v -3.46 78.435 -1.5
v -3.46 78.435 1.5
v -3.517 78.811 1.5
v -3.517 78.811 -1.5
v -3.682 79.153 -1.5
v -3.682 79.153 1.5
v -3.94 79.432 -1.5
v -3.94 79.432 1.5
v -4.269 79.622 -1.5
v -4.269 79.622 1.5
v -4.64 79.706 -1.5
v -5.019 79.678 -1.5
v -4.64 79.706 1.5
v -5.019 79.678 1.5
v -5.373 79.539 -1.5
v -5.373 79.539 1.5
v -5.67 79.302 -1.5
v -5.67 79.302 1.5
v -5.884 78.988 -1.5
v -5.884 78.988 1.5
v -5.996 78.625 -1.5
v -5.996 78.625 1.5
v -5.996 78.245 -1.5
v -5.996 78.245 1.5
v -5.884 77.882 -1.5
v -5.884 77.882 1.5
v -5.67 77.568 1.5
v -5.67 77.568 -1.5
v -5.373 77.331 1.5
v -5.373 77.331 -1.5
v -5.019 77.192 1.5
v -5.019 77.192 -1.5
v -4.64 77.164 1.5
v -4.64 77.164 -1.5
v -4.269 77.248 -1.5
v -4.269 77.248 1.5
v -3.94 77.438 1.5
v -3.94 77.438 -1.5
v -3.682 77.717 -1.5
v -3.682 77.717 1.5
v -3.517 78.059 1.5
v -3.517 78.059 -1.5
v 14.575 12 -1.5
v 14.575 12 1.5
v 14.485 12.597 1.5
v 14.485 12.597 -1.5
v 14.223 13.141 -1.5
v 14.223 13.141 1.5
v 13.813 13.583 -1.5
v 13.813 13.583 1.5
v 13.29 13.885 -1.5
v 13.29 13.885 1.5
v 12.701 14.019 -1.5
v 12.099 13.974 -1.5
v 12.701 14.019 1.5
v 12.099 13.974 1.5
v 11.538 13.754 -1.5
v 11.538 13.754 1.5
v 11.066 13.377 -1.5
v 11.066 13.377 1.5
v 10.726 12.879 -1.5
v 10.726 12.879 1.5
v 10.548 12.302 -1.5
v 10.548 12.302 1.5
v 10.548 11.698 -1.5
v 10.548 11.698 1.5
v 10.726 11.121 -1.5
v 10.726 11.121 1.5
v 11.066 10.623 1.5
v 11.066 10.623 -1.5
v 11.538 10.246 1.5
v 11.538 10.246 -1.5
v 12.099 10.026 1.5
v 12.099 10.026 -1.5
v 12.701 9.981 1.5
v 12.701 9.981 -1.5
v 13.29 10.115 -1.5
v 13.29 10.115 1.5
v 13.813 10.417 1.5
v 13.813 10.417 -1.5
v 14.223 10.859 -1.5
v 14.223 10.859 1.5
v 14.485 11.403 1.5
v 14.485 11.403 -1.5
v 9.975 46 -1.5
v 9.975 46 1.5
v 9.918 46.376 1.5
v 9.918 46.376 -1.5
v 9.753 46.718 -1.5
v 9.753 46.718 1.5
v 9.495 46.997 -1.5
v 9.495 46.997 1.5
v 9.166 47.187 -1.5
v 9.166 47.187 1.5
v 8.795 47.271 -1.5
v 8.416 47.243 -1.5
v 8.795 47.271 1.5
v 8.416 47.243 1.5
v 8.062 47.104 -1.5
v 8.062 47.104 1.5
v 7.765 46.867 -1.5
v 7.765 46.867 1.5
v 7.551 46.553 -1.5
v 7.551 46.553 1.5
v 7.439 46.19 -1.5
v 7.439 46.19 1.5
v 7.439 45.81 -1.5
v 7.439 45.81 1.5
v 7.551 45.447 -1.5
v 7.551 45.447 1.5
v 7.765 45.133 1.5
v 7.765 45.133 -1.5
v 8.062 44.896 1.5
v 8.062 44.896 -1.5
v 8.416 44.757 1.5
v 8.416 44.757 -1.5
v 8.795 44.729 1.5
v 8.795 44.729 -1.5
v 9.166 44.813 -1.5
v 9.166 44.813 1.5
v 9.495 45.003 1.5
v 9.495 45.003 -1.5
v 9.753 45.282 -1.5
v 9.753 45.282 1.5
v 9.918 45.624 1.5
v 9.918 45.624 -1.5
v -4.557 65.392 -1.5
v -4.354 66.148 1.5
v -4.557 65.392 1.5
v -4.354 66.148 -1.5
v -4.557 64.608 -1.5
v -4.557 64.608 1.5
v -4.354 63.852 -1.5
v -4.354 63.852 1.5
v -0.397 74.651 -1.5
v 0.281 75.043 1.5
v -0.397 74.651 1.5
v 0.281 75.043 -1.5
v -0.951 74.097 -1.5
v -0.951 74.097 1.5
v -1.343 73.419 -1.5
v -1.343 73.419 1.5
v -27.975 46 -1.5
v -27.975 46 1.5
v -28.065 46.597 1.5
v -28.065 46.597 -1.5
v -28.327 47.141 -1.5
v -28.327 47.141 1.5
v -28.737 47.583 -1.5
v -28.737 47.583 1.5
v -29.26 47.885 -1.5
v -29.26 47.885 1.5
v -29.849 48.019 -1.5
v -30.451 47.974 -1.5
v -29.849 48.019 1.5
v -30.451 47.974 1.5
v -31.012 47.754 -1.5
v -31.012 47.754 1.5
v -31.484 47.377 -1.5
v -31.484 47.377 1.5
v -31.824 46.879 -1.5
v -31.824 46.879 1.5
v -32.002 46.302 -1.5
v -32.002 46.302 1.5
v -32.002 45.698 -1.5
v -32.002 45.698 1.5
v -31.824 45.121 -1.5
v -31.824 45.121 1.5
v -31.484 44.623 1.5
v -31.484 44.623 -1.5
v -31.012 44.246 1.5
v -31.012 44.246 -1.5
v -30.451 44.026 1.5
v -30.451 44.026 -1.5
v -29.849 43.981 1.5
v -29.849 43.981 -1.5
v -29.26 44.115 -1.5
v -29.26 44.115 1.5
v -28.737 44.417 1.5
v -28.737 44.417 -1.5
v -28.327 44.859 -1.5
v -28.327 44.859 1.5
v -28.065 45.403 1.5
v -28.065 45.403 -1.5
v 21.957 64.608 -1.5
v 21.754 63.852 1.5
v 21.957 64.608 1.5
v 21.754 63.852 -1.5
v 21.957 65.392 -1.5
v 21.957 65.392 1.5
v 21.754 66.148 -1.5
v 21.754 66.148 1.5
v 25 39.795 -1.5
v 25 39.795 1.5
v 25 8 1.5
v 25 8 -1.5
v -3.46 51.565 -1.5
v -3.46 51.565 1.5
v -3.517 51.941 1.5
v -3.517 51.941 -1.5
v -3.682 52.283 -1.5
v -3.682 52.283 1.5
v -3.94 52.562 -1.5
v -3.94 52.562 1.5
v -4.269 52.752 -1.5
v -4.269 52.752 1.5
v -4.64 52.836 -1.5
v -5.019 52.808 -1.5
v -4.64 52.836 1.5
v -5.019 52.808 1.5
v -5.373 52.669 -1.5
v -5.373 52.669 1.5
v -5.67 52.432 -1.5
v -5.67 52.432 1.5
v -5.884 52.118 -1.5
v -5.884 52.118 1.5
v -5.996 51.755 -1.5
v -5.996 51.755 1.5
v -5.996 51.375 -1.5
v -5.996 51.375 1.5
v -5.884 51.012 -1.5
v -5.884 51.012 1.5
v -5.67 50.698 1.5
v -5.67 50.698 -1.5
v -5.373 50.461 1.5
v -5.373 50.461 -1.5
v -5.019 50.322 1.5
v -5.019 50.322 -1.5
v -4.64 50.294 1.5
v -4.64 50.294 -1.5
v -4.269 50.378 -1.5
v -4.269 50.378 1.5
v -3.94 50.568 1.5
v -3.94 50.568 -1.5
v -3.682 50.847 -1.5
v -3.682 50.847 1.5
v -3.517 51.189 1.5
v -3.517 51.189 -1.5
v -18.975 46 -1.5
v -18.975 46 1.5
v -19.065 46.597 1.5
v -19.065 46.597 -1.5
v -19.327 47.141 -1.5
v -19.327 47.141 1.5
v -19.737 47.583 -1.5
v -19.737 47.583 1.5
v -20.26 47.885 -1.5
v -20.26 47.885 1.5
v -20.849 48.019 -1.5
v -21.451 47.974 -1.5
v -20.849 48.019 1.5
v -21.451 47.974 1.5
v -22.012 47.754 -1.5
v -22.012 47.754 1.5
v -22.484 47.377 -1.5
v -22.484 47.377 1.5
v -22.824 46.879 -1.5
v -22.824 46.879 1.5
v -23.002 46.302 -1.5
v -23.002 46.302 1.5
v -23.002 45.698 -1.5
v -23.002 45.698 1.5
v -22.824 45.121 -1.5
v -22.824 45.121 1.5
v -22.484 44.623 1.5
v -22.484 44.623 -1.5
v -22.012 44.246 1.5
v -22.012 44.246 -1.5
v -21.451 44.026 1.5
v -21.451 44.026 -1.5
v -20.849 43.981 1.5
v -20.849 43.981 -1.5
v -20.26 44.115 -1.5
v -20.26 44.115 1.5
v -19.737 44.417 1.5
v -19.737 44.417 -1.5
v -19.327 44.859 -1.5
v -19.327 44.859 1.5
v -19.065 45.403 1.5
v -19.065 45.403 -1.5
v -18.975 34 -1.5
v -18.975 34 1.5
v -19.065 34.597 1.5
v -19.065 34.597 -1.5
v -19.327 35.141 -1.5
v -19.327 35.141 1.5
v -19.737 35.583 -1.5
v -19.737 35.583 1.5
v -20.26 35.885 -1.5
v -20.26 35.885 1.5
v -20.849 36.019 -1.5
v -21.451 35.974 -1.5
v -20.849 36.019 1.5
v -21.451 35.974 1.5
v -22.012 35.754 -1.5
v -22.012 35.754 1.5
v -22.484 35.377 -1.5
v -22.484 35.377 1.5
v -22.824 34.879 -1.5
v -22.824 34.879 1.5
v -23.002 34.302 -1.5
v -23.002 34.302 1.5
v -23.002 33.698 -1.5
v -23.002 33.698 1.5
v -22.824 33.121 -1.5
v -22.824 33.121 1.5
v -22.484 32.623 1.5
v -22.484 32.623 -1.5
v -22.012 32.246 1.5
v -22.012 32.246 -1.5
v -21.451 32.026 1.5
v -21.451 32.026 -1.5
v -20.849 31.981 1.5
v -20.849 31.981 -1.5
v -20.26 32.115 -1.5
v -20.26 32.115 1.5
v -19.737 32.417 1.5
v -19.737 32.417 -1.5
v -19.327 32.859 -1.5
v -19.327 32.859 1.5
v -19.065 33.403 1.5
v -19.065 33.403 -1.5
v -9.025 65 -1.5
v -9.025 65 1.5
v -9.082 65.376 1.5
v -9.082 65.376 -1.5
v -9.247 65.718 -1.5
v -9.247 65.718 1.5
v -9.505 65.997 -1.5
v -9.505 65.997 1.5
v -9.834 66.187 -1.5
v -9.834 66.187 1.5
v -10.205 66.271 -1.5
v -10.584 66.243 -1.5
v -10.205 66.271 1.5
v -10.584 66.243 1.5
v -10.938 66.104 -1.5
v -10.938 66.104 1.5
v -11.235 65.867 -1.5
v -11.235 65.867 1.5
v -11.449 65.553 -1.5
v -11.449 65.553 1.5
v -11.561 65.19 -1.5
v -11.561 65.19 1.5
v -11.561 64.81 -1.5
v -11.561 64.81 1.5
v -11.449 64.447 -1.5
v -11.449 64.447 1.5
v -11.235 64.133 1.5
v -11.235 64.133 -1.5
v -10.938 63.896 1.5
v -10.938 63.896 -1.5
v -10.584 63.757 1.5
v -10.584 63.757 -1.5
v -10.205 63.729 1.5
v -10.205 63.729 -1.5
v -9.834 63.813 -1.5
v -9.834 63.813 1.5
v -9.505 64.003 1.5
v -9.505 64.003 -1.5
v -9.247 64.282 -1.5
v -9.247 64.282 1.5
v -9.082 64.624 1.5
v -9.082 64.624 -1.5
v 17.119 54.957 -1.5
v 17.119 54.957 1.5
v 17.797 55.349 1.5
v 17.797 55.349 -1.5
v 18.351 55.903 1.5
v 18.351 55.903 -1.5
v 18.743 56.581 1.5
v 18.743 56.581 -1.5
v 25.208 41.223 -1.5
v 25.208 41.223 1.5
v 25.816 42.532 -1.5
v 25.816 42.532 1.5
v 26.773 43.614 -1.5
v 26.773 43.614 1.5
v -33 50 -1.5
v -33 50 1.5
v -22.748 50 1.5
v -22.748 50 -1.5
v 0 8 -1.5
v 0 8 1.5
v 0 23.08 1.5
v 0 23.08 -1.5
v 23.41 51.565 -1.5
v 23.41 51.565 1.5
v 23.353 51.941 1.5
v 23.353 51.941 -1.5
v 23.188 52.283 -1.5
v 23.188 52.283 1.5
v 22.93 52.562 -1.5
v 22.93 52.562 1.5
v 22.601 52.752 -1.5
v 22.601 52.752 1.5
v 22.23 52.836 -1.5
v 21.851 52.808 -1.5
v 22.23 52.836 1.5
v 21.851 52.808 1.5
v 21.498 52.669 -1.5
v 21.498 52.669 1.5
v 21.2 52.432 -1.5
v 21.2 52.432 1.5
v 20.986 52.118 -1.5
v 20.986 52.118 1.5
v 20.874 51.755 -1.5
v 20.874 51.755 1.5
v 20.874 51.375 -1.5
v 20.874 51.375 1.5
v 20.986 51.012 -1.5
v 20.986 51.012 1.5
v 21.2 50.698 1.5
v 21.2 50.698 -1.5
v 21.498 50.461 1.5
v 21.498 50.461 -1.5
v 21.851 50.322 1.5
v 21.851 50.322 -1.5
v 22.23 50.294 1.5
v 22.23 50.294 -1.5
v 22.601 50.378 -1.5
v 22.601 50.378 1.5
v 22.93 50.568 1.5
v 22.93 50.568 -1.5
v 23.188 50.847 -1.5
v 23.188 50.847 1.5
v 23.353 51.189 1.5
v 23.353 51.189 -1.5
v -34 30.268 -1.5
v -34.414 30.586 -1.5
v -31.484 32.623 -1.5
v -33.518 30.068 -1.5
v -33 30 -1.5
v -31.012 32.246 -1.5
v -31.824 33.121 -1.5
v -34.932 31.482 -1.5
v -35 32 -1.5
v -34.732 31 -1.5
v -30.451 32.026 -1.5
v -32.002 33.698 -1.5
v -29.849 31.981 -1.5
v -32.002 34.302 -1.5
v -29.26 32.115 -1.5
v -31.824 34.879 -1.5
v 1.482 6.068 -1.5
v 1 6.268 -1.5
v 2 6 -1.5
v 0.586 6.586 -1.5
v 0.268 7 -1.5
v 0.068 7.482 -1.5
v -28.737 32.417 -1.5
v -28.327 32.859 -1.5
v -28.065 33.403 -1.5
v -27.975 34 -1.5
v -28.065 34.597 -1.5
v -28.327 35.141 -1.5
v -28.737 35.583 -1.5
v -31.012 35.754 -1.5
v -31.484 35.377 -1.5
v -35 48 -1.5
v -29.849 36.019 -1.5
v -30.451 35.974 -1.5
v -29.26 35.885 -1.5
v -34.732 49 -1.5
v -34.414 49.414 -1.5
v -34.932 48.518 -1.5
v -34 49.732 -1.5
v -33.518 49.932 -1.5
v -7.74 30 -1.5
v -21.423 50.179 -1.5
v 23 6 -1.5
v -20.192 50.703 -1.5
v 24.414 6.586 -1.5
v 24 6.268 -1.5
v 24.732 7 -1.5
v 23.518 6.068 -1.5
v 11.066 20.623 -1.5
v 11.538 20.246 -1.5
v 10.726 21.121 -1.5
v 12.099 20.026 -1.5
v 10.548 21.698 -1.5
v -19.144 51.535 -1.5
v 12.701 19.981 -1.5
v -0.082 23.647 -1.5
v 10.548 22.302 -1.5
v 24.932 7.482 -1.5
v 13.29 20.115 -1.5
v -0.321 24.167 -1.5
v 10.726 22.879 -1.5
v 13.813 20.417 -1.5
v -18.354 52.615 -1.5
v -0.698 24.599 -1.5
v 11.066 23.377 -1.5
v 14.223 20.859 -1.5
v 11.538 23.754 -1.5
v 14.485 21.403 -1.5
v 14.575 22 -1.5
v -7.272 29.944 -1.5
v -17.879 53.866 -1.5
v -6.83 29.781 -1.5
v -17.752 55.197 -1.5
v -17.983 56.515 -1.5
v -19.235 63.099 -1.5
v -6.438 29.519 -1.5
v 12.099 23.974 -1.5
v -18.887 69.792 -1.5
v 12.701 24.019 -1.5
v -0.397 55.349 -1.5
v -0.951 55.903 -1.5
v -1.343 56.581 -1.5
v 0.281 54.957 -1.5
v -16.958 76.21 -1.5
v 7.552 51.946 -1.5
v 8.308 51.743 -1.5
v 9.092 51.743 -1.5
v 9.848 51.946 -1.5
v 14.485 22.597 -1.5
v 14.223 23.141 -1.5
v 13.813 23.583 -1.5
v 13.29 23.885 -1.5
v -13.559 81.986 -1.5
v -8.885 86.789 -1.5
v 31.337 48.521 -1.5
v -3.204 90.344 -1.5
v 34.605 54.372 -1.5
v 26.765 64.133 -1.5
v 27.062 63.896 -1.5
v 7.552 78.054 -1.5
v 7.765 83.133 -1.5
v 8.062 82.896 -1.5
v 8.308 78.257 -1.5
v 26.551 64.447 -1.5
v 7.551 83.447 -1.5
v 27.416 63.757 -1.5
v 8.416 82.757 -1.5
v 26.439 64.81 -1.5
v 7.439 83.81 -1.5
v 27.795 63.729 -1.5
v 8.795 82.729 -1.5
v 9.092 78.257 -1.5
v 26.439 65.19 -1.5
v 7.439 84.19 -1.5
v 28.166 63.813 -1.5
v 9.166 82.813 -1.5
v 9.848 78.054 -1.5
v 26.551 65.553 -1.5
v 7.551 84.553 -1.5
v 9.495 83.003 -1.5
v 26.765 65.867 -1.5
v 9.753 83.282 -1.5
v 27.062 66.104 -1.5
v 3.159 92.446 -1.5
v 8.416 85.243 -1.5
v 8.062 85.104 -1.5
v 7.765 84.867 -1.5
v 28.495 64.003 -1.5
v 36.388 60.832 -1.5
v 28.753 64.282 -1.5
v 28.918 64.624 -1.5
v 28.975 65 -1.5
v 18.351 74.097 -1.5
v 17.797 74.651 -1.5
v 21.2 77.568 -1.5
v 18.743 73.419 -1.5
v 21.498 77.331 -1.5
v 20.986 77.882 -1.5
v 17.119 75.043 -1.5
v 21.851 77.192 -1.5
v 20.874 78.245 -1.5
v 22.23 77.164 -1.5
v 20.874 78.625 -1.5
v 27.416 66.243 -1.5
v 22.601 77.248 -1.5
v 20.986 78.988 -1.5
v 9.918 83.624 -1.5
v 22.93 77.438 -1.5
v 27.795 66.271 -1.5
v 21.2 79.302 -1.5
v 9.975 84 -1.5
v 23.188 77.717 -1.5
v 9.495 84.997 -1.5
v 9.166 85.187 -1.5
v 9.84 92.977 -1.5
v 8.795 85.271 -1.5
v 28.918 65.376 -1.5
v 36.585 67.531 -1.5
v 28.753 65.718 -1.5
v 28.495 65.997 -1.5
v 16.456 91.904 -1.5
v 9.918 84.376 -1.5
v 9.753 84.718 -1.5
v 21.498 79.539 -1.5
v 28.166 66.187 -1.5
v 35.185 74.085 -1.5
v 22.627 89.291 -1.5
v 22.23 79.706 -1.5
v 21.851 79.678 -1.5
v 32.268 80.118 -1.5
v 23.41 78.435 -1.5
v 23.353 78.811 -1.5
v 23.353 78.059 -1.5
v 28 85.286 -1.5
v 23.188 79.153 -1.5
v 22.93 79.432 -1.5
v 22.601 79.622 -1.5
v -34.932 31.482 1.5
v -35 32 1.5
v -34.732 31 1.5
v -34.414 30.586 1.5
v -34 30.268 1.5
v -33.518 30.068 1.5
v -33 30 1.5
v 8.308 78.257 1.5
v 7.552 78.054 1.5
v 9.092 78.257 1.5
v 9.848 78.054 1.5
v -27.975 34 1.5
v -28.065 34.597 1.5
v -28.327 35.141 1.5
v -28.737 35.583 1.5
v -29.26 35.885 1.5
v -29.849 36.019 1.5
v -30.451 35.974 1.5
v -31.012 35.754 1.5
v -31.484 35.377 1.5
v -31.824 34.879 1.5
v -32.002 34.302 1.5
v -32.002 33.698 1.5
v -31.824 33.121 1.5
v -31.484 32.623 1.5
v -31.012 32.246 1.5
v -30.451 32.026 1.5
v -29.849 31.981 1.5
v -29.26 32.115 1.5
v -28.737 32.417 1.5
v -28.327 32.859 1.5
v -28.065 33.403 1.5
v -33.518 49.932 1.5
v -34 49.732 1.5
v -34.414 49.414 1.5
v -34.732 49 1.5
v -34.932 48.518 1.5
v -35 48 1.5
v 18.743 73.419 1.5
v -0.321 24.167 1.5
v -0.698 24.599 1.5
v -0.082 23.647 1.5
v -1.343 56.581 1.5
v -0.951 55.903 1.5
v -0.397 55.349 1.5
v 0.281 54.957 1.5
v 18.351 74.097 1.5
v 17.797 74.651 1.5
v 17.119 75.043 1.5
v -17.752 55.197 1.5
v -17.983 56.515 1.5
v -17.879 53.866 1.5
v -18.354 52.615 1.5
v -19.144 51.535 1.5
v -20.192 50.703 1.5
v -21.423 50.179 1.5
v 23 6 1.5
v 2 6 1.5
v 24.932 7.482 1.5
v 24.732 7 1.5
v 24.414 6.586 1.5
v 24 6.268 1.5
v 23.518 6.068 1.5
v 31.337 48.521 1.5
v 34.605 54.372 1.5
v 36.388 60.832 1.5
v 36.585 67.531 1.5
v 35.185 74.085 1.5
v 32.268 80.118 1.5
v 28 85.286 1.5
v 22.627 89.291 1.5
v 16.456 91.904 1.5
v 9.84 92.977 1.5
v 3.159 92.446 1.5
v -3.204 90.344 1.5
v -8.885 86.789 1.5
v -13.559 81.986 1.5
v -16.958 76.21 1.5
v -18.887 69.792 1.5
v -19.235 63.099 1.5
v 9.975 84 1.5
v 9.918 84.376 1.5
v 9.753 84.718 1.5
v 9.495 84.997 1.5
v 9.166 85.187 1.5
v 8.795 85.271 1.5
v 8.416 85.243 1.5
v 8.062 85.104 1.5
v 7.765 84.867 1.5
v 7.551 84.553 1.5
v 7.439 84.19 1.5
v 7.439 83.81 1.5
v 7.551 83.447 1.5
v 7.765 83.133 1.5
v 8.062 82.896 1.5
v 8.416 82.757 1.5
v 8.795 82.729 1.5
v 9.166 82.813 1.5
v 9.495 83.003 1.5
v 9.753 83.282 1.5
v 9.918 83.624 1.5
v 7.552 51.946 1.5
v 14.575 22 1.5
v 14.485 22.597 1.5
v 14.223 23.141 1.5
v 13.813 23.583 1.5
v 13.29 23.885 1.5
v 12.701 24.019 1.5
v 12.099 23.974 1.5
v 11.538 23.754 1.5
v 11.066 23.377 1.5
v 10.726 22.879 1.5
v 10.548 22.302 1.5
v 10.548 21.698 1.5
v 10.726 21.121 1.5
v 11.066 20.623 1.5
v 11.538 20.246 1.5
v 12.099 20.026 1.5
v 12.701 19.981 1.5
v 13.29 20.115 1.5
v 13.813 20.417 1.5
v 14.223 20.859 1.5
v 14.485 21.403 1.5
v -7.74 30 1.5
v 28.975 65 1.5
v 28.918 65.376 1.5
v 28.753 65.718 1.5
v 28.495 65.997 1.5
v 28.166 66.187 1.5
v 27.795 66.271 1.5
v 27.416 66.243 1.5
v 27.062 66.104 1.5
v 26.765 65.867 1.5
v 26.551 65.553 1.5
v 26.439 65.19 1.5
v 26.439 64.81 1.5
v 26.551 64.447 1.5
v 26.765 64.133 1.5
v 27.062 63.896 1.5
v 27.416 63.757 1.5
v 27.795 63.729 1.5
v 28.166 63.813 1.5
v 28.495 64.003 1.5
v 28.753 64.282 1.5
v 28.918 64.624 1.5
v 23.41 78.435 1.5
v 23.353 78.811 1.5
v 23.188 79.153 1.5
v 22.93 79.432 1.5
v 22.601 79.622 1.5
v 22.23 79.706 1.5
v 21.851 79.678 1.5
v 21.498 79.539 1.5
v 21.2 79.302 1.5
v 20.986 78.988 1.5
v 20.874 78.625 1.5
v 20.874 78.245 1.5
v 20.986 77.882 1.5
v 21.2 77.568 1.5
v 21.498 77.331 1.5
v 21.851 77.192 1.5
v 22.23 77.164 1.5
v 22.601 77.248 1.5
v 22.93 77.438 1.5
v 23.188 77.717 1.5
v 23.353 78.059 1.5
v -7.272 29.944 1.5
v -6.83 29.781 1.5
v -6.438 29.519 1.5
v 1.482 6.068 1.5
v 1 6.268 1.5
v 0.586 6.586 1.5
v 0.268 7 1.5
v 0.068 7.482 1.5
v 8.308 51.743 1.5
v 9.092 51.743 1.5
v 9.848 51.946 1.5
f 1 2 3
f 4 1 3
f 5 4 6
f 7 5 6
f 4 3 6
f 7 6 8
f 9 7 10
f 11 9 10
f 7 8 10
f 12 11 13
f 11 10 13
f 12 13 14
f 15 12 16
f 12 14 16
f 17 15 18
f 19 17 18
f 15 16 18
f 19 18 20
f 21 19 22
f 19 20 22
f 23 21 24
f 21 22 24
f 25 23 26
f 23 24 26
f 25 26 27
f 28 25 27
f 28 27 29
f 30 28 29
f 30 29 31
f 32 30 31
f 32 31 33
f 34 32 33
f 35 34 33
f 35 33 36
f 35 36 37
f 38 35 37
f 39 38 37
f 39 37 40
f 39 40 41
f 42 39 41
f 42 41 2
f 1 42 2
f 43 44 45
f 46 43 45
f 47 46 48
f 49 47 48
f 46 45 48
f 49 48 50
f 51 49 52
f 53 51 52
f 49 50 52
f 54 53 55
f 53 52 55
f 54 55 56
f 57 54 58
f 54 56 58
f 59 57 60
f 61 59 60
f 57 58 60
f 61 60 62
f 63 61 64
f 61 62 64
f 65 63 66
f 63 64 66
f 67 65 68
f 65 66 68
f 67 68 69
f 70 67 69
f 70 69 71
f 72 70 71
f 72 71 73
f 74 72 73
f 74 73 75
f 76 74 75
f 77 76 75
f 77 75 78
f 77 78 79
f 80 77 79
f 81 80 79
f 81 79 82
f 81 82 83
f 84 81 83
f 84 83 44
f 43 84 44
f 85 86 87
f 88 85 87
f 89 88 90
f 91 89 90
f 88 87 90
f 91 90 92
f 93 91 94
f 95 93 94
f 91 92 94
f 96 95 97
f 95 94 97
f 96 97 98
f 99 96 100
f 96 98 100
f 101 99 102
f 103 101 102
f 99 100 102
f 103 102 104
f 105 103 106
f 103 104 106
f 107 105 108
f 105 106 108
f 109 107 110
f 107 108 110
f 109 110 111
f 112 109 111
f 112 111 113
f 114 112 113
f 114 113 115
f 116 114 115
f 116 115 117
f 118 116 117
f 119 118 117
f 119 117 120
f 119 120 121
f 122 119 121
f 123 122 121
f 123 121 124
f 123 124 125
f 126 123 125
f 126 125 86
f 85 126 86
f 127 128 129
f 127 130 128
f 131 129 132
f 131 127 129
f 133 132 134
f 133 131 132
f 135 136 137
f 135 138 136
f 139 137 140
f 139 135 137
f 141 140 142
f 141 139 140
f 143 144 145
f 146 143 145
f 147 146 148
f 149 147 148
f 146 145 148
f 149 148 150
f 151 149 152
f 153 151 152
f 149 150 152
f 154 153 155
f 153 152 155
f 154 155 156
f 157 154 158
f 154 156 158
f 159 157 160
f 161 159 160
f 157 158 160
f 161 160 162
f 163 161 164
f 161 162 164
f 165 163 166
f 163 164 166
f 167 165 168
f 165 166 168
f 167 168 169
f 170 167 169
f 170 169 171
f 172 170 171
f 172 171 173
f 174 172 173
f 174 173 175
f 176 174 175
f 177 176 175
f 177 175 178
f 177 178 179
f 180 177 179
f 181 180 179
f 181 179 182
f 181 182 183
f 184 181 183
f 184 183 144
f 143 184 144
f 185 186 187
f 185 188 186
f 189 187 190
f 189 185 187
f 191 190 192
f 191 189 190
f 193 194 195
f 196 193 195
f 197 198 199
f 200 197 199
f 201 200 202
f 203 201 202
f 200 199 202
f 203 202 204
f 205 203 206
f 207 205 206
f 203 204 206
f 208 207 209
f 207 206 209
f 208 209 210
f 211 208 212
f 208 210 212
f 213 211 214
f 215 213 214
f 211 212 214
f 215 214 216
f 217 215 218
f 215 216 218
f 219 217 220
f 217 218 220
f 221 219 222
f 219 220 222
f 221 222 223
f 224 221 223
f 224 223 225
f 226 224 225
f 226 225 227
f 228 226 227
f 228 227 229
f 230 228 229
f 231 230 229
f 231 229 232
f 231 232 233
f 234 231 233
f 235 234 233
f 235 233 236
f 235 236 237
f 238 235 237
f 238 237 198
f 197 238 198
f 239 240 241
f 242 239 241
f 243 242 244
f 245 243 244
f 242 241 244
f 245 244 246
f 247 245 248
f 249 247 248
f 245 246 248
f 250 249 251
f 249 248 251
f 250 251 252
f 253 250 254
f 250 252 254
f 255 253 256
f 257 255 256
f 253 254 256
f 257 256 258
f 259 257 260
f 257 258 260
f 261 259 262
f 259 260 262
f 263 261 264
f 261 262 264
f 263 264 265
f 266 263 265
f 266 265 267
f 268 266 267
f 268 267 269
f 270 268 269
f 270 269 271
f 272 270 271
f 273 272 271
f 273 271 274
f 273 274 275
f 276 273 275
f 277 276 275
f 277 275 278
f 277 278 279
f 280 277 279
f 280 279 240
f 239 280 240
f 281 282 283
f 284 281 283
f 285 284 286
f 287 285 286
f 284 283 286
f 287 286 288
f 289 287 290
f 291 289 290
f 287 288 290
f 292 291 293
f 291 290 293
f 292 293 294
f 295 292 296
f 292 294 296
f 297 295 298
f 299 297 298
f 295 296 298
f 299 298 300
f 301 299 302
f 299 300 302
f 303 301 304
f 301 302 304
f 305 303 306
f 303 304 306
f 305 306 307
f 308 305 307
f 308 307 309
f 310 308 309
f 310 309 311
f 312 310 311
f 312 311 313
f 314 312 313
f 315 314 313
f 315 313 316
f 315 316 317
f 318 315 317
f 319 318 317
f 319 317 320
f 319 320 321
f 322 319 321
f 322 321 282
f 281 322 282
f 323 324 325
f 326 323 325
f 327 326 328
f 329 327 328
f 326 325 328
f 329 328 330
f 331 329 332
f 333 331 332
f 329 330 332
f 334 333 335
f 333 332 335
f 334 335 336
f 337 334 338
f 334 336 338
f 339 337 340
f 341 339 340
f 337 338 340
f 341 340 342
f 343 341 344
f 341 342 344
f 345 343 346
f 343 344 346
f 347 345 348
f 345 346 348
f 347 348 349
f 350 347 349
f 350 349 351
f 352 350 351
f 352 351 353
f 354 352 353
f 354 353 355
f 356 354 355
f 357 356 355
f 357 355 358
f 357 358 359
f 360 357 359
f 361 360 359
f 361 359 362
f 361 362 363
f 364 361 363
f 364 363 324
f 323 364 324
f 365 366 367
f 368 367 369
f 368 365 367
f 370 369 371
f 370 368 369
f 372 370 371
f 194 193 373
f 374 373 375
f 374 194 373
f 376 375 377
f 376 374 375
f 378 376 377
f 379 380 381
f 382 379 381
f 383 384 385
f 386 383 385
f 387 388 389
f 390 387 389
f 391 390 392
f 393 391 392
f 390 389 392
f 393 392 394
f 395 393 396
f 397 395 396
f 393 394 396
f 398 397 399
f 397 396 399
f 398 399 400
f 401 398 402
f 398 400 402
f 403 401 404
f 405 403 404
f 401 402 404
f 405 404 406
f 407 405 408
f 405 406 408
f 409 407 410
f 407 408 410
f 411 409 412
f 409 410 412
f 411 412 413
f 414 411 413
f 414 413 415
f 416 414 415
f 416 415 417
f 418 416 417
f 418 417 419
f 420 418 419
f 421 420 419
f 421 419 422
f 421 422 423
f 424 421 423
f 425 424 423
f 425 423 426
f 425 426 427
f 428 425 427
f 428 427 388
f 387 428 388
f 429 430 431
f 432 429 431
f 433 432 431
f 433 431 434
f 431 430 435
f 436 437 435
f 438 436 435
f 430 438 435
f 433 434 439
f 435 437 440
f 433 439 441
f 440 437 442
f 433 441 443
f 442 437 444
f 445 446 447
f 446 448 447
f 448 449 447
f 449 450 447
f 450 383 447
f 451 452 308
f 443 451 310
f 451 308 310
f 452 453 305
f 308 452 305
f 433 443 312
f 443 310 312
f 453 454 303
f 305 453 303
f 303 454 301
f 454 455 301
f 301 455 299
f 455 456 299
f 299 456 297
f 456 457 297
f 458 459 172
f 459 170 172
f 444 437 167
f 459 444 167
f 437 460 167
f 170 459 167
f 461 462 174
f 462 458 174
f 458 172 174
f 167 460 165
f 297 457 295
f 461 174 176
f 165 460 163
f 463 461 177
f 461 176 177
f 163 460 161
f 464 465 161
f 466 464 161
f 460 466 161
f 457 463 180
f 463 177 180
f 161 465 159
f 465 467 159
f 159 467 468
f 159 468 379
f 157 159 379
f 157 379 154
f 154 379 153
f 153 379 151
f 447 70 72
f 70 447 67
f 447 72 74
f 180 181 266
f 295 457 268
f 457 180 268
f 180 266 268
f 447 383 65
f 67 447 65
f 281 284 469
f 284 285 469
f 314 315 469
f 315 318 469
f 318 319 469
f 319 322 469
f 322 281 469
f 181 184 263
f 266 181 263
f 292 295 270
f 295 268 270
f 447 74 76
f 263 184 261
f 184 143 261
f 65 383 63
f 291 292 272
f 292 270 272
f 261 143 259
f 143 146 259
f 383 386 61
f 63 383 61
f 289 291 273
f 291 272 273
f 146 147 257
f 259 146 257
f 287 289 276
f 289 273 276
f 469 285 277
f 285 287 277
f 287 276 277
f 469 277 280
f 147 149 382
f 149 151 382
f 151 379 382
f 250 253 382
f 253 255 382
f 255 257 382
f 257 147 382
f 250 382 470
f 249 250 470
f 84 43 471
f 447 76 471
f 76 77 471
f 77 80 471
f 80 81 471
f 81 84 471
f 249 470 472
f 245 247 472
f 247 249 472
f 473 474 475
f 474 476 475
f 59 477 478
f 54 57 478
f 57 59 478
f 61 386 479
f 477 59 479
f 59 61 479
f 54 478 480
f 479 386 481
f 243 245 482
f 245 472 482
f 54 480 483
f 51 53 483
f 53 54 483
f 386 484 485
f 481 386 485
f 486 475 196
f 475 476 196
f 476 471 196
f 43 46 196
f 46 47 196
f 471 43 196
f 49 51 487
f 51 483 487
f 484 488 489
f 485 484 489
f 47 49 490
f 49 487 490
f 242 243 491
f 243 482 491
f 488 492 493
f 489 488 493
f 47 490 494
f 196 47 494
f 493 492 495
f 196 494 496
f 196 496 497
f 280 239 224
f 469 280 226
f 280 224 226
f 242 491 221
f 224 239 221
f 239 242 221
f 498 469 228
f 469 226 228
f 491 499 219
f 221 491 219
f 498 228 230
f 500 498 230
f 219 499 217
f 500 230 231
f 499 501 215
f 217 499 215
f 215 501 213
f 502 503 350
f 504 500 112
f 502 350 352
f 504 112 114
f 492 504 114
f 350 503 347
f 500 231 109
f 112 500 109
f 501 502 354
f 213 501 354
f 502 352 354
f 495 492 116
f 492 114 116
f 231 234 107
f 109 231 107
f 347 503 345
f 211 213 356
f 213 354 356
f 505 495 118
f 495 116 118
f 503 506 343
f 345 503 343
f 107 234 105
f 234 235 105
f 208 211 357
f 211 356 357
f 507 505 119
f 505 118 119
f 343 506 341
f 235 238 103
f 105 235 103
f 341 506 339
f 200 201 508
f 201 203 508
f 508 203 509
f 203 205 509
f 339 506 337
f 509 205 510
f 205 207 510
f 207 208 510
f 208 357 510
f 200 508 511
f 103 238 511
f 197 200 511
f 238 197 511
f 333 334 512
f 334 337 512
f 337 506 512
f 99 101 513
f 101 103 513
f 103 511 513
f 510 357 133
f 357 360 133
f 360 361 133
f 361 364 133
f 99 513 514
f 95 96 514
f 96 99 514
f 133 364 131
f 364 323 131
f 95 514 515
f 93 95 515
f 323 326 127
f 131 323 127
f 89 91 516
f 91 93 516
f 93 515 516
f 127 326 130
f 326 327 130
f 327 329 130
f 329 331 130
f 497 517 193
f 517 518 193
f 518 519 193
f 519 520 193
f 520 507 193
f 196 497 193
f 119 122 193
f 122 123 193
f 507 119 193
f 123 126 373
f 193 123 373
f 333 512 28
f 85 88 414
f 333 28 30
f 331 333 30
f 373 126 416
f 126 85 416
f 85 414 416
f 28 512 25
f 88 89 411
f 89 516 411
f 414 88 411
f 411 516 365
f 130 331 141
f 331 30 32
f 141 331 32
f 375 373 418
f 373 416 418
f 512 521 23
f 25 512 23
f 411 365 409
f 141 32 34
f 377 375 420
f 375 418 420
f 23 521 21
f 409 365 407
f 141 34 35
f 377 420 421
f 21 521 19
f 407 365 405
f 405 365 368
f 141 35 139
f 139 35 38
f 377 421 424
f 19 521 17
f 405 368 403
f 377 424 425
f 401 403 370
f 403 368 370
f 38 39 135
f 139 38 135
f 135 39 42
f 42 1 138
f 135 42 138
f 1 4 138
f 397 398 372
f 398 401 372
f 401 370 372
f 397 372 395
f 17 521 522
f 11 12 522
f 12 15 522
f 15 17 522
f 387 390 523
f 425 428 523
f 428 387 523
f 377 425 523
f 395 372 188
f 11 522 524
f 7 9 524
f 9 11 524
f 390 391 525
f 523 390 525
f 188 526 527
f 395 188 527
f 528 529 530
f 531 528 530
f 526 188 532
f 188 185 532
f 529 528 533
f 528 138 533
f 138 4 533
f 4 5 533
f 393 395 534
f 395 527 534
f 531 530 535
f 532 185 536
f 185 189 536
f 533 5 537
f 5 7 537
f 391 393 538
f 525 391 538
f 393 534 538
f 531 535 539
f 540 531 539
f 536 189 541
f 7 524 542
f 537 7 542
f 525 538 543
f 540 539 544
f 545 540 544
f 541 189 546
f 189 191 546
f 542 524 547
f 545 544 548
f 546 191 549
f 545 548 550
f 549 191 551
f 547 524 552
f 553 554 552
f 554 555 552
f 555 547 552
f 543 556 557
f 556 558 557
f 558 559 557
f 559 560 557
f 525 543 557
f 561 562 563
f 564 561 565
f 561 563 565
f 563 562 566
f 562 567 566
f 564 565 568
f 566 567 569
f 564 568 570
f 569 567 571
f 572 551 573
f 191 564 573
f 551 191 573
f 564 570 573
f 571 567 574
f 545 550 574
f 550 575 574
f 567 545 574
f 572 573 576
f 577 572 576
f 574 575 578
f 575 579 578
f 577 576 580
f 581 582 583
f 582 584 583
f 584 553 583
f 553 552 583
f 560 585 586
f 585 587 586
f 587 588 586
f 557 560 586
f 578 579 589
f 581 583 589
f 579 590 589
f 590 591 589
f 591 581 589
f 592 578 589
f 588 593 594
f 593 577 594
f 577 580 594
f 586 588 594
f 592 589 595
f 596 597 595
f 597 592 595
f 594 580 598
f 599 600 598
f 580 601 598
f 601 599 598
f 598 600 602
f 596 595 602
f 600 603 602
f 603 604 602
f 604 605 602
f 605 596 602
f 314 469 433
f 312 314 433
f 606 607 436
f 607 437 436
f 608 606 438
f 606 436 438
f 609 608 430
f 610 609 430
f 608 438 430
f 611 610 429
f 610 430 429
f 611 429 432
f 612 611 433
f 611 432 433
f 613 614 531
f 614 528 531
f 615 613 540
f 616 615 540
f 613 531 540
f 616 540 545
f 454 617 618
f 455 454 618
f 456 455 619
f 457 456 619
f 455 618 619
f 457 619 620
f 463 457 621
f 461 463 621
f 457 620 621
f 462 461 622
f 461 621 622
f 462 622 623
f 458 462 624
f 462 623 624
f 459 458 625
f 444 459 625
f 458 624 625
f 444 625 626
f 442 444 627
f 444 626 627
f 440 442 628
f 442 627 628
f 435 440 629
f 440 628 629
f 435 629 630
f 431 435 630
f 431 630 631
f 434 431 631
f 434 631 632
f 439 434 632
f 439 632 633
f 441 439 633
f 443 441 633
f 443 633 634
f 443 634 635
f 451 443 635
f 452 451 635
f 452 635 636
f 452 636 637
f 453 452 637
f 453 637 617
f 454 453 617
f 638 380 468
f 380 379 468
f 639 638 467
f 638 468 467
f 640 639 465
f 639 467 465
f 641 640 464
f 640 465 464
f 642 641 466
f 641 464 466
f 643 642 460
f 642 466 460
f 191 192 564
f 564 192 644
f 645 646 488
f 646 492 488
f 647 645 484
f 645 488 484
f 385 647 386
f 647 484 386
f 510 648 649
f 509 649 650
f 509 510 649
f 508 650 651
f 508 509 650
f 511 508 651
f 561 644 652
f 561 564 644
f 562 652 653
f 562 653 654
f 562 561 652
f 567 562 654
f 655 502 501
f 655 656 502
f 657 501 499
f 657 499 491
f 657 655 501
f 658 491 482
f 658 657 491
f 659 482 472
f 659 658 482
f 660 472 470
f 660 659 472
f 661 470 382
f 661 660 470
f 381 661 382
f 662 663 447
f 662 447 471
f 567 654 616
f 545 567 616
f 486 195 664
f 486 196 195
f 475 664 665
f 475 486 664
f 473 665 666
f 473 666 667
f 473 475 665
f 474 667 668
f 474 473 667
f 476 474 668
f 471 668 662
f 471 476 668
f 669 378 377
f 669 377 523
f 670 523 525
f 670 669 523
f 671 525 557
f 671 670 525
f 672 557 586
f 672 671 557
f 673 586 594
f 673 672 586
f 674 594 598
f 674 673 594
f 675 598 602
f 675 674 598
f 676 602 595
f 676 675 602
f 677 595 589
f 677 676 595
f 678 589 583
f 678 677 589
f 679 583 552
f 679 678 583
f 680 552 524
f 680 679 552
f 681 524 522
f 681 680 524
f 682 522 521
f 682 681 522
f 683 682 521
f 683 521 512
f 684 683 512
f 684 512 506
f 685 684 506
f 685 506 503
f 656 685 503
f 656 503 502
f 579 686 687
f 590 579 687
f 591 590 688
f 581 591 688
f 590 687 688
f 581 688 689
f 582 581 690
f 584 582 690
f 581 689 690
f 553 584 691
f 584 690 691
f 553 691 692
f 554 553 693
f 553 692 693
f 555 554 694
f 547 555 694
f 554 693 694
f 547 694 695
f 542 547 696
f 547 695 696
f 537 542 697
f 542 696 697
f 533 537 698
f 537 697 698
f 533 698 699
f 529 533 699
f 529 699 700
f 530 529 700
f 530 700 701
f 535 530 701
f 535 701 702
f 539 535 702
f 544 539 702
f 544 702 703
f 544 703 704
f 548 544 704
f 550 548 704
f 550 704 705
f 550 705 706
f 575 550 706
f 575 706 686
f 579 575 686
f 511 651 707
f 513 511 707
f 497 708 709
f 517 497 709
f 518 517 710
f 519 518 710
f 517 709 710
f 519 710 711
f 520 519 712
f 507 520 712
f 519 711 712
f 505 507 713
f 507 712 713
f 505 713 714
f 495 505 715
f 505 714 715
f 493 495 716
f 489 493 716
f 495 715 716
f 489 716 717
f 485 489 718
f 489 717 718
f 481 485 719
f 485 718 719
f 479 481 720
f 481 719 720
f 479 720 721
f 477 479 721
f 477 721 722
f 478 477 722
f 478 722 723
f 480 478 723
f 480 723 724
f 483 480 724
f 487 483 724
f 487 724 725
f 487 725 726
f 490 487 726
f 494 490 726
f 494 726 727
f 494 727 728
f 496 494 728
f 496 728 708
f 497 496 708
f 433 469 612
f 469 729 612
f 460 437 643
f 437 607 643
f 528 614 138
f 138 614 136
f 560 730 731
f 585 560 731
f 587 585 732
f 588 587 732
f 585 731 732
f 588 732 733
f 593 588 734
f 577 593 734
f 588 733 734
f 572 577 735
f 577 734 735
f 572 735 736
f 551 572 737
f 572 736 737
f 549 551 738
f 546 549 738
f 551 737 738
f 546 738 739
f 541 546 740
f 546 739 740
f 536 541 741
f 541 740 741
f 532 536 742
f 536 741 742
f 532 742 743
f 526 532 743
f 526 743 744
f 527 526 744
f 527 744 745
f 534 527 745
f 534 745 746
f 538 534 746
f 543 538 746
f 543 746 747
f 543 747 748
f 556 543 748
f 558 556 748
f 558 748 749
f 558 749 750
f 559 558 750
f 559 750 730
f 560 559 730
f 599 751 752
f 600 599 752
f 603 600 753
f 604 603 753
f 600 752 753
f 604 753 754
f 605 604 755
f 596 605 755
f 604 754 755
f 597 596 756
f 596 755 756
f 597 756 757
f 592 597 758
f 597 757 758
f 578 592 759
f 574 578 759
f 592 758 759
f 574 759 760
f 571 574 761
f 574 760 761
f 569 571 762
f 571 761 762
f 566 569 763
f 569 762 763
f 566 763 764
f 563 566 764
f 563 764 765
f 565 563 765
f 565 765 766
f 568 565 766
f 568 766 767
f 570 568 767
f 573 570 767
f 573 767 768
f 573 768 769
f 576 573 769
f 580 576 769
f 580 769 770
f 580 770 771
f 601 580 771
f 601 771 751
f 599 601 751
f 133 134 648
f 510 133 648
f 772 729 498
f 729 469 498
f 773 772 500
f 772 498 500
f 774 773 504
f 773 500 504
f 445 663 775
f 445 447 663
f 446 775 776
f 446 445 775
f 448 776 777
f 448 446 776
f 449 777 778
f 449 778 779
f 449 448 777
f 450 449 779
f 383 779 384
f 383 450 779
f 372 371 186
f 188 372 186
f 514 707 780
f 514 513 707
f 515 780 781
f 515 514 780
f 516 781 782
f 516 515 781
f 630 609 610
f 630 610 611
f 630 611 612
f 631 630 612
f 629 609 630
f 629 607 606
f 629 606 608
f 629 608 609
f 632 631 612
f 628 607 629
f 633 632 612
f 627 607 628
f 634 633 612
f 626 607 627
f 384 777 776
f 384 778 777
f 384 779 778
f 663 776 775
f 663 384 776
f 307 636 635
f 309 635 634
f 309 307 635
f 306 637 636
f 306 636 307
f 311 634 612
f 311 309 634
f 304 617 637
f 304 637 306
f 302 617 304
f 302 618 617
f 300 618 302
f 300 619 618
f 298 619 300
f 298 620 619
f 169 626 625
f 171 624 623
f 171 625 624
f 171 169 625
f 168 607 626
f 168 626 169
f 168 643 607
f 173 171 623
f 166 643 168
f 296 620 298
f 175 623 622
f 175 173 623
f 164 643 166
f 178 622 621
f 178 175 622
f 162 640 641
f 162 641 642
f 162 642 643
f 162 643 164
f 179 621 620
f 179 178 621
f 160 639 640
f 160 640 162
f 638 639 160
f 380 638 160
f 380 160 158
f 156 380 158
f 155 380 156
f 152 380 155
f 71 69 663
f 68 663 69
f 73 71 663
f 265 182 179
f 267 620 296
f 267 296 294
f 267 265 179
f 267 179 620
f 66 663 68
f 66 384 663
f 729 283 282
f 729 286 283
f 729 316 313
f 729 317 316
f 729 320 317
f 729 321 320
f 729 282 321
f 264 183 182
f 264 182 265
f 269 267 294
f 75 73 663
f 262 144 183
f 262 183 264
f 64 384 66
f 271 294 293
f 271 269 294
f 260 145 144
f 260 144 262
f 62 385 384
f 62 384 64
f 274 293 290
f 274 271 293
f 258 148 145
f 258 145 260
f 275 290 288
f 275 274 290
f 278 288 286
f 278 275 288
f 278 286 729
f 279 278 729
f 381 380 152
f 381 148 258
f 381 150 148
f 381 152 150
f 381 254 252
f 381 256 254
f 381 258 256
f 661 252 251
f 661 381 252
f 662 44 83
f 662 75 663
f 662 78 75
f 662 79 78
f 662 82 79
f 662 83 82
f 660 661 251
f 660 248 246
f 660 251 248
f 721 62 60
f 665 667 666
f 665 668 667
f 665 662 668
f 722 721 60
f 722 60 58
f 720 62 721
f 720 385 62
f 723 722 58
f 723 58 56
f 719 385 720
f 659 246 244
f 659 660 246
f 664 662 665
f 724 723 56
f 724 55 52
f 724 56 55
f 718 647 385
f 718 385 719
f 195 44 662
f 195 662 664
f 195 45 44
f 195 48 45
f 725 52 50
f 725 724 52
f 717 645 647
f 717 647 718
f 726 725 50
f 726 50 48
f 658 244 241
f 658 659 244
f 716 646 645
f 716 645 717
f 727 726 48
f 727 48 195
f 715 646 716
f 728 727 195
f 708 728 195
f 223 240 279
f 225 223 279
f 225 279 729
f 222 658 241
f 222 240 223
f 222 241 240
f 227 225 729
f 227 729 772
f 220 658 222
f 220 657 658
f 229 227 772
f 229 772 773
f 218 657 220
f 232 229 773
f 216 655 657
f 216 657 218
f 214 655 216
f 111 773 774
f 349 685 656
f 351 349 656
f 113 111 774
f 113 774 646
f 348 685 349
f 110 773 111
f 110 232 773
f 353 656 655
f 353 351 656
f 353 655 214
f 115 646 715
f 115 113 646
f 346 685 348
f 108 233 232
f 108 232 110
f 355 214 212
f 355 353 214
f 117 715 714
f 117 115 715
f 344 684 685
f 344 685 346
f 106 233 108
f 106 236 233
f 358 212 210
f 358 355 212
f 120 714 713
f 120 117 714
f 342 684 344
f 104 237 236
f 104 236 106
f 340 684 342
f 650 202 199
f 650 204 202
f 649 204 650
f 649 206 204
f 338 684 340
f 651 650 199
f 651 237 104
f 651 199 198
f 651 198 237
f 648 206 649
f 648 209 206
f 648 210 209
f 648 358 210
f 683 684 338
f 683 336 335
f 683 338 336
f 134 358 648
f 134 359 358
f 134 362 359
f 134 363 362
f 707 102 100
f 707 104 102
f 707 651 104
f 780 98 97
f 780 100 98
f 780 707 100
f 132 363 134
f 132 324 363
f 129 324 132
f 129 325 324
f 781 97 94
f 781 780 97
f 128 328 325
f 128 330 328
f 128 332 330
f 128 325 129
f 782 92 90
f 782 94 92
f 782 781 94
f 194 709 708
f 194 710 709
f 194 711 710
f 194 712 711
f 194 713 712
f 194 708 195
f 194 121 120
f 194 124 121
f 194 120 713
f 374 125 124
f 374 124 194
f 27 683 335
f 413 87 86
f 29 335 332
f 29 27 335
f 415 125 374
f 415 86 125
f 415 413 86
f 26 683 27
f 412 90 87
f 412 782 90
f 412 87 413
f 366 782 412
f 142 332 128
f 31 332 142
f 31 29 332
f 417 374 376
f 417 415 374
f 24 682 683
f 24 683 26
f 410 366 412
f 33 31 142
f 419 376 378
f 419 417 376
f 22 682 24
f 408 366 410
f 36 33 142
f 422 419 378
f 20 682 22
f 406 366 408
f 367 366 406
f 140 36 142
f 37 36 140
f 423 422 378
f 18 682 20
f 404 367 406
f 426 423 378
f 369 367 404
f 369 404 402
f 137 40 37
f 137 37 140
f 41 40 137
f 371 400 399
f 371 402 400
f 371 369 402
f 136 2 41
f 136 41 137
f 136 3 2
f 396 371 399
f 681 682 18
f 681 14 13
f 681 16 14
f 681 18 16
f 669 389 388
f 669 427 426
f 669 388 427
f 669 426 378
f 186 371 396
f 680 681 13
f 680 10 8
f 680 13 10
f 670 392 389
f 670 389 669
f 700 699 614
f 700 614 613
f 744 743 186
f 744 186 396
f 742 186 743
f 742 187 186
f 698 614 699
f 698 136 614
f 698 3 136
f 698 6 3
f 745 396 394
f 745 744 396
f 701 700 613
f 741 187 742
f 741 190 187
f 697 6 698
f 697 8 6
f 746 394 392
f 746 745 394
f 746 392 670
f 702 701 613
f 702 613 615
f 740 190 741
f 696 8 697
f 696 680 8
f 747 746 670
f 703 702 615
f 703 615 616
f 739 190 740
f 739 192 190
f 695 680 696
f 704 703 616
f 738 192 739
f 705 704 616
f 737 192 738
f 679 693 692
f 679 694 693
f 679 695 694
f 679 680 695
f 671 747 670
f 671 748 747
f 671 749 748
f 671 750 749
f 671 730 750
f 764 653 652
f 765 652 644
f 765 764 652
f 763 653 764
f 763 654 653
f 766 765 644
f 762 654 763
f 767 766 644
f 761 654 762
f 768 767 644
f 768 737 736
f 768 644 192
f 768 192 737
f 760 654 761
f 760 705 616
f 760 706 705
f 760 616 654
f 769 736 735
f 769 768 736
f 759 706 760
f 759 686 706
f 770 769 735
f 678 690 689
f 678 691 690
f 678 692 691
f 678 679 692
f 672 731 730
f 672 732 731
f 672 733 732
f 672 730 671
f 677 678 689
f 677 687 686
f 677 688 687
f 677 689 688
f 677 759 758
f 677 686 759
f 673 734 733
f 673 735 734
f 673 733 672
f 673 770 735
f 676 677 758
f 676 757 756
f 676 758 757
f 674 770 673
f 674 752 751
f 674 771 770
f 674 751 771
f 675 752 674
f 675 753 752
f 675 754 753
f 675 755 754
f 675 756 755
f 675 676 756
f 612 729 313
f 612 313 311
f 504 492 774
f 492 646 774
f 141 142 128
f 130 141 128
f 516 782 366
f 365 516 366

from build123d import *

# Parameters (mm, degrees)
EXTRUDE_1_DEPTH          = 1.5
SKETCH_2_R               = 28
EXTRUDE_2_DEPTH          = 3
FILLET_1_R               = 2
SKETCH_3_R               = 1.275
CUT_EXTRUDE_1_DEPTH      = 4
SKETCH_4_R               = 2.025
CUT_EXTRUDE_2_DEPTH      = 4
SKETCH_5_W               = 25
SKETCH_5_H               = 6
CUT_EXTRUDE_3_DEPTH      = 4
FILLET_2_R               = 2
SKETCH_6_R               = 2.025
CUT_EXTRUDE_4_DEPTH      = 10
FILLET_3_R               = 5
SKETCH_7_R               = 2.025
CUT_EXTRUDE_5_DEPTH      = 1
CUT_EXTRUDE_5_DEPTH_BACK = 4
CUT_EXTRUDE_6_DEPTH      = 10
FILLET_4_R               = 3


with BuildPart() as part:
    # 草图1 → 凸台-拉伸1 (new body, symmetric)
    with BuildSketch(Plane.XY):
        Polygon((0, 0), (0, 24), (-7, 30), (-35, 30), (-35, 50), (25, 50), (25, 0), align=None)
    extrude(amount=EXTRUDE_1_DEPTH, both=True)

    # 草图2 → 凸台-拉伸2 (add)
    with BuildSketch(Plane.XY.offset(1.5)):
        with Locations((8.7, 65)):
            Circle(SKETCH_2_R)
    extrude(amount=-EXTRUDE_2_DEPTH)

    # 圆角1
    fillet_1_edges = [part.edges().sort_by_distance(p)[0] for p in [
        (0, 0, 0),
        (0, 24, 0),
        (-7, 30, 0),
        (-35, 30, 0),
        (-35, 50, 0),
        (25, 0, 0),
    ]]
    fillet(fillet_1_edges, radius=FILLET_1_R)

    # 草图3 → 切除-拉伸1 (cut, through all)
    with BuildSketch(Plane.XY.offset(1.5)):
        with Locations((22.135028843, 78.435028843)):
            Circle(SKETCH_3_R)
        with Locations((27.7, 65)):
            Circle(SKETCH_3_R)
        with Locations((22.135028843, 51.564971157)):
            Circle(SKETCH_3_R)
        with Locations((8.7, 46)):
            Circle(SKETCH_3_R)
        with Locations((-4.735028843, 51.564971157)):
            Circle(SKETCH_3_R)
        with Locations((-10.3, 65)):
            Circle(SKETCH_3_R)
        with Locations((-4.735028843, 78.435028843)):
            Circle(SKETCH_3_R)
        with Locations((8.7, 84)):
            Circle(SKETCH_3_R)
    extrude(amount=-CUT_EXTRUDE_1_DEPTH, mode=Mode.SUBTRACT)

    # 草图4 → 切除-拉伸2 (cut, through all)
    with BuildSketch(Plane.XY.offset(1.5)):
        with Locations((12.55, 22)):
            Circle(SKETCH_4_R)
        with Locations((12.55, 12)):
            Circle(SKETCH_4_R)
    extrude(amount=-CUT_EXTRUDE_2_DEPTH, mode=Mode.SUBTRACT)

    # 草图5 → 切除-拉伸3 (cut, through all)
    with BuildSketch(Plane.XY.offset(1.5)):
        with Locations((12.5, 3)):
            Rectangle(SKETCH_5_W, SKETCH_5_H)
    extrude(amount=-CUT_EXTRUDE_3_DEPTH, mode=Mode.SUBTRACT)

    # 圆角2
    fillet_2_edges = [part.edges().sort_by_distance(p)[0] for p in [
        (0, 6, 0),
        (25, 6, 0),
    ]]
    fillet(fillet_2_edges, radius=FILLET_2_R)

    # 草图6 → 切除-拉伸4 (cut)
    with BuildSketch(Plane.XY.offset(1.5)):
        with Locations((-30, 46)):
            Circle(SKETCH_6_R)
        with Locations((-30, 34)):
            Circle(SKETCH_6_R)
    extrude(amount=-CUT_EXTRUDE_4_DEPTH, mode=Mode.SUBTRACT)

    # 圆角3
    fillet_3_edges = [part.edges().sort_by_distance(p)[0] for p in [
        (25, 42.233577356, 0),
        (-14.943180835, 50, 0),
    ]]
    fillet(fillet_3_edges, radius=FILLET_3_R)

    # 草图7 → 切除-拉伸5 (cut, two sides)
    with BuildSketch(Plane.XY.offset(1.5)) as cut_extrude_5_sk:
        with Locations((-21, 46)):
            Circle(SKETCH_7_R)
        with Locations((-21, 34)):
            Circle(SKETCH_7_R)
    extrude(amount=CUT_EXTRUDE_5_DEPTH, mode=Mode.SUBTRACT)
    extrude(cut_extrude_5_sk.sketch, amount=-CUT_EXTRUDE_5_DEPTH_BACK, mode=Mode.SUBTRACT)

    # 草图8 → 切除-拉伸6 (cut)
    with BuildSketch(Plane.XY.offset(1.5)):
        Polygon((8.7, 78.529902504), (-0.867085809, 74.567085809), (-4.829902504, 65), (-0.867085809, 55.432914191), (8.7, 51.470097496), (18.267085809, 55.432914191), (22.229902504, 65), (18.267085809, 74.567085809), align=None)
    extrude(amount=-CUT_EXTRUDE_6_DEPTH, mode=Mode.SUBTRACT)

    # 圆角4
    fillet_4_edges = [part.edges().sort_by_distance(p)[0] for p in [
        (8.7, 78.529902504, 0),
        (18.267085809, 74.567085809, 0),
        (22.229902504, 65, 0),
        (18.267085809, 55.432914191, 0),
        (8.7, 51.470097496, 0),
        (-0.867085809, 55.432914191, 0),
        (-4.829902504, 65, 0),
        (-0.867085809, 74.567085809, 0),
    ]]
    fillet(fillet_4_edges, radius=FILLET_4_R)


solid = part.part
